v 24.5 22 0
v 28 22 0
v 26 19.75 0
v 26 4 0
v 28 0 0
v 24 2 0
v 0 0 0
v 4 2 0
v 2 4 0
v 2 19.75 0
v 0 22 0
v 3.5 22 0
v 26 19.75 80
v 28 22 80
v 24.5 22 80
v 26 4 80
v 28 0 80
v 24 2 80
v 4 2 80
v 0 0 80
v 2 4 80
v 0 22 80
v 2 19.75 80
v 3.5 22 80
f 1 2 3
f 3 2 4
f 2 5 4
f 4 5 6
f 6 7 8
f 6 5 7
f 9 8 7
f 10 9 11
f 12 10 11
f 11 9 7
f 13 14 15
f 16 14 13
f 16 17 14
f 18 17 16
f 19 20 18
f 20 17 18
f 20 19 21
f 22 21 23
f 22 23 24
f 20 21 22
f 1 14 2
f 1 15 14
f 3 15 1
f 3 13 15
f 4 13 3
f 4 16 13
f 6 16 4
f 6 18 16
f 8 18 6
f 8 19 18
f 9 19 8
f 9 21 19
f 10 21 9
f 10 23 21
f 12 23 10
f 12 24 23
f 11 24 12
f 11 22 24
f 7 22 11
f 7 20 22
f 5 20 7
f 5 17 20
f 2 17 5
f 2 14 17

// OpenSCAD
// Total lengde 950mm
hull_d = 4;
hullbrem_d = 10;
hullbrem_h = 1.2;
hull_dist = 20;
bruk_skruehull = false;
bunn = 2 + (bruk_skruehull ? hullbrem_h : 0);
hull_h = bunn;
bredde = 24;
hoyde = 20;
lengde = 80;
vegg = 2;
avrunding = vegg;
kant = 1.5;
vkant = kant*1.5;

skinne_p = [
    [0,0],
    [bredde+vegg*2, 0],
    [bredde+vegg*2, hoyde+bunn],
    [bredde+vegg-kant, hoyde+bunn],
    [bredde+vegg, hoyde+bunn-vkant],
    [bredde+avrunding, bunn+avrunding],
    [bredde, bunn],
    [vegg+avrunding, bunn],
    [vegg, bunn+avrunding],
    [vegg, bunn],
    [vegg, hoyde+bunn-vkant],
    [vegg+kant, hoyde+bunn],
    [0, hoyde+bunn],
    [0, hoyde],
];

module skruehull(
    hull_d = hull_d,
    hull_h = hull_h, 
    dybde = bunn, 
    hullbrem_d = hullbrem_d, 
    hullbrem_h = hullbrem_h) {
    cylinder(d=hullbrem_d, h=hullbrem_h, $fn=128);
    translate([0,0,hullbrem_h]) {
        cylinder(d=hull_d, h=hull_h-hullbrem_h, $fn=128);
    }
}

module skinne(storrelse = skinne_p, hoyde = lengde) {
    difference() {
        linear_extrude(lengde) {
            polygon(skinne_p);
            /*
            translate([tykkelse,tykkelse]) {
                square([tykkelse,tykkelse]);
            }
            translate([bredde,tykkelse]) {
                square([tykkelse,tykkelse]);
            }
            */
        }
        if (bruk_skruehull) {
            translate([bredde/2+vegg,hull_h,hull_dist]) {
                rotate([90,0,0]) {
                    skruehull();
                    echo ("høl");
                }
            }
            translate([bredde/2+vegg,hull_h,lengde-hull_dist]) {
                rotate([90,0,0]) {
                    skruehull();
                }
            }
        }
    }
}

skinne();
